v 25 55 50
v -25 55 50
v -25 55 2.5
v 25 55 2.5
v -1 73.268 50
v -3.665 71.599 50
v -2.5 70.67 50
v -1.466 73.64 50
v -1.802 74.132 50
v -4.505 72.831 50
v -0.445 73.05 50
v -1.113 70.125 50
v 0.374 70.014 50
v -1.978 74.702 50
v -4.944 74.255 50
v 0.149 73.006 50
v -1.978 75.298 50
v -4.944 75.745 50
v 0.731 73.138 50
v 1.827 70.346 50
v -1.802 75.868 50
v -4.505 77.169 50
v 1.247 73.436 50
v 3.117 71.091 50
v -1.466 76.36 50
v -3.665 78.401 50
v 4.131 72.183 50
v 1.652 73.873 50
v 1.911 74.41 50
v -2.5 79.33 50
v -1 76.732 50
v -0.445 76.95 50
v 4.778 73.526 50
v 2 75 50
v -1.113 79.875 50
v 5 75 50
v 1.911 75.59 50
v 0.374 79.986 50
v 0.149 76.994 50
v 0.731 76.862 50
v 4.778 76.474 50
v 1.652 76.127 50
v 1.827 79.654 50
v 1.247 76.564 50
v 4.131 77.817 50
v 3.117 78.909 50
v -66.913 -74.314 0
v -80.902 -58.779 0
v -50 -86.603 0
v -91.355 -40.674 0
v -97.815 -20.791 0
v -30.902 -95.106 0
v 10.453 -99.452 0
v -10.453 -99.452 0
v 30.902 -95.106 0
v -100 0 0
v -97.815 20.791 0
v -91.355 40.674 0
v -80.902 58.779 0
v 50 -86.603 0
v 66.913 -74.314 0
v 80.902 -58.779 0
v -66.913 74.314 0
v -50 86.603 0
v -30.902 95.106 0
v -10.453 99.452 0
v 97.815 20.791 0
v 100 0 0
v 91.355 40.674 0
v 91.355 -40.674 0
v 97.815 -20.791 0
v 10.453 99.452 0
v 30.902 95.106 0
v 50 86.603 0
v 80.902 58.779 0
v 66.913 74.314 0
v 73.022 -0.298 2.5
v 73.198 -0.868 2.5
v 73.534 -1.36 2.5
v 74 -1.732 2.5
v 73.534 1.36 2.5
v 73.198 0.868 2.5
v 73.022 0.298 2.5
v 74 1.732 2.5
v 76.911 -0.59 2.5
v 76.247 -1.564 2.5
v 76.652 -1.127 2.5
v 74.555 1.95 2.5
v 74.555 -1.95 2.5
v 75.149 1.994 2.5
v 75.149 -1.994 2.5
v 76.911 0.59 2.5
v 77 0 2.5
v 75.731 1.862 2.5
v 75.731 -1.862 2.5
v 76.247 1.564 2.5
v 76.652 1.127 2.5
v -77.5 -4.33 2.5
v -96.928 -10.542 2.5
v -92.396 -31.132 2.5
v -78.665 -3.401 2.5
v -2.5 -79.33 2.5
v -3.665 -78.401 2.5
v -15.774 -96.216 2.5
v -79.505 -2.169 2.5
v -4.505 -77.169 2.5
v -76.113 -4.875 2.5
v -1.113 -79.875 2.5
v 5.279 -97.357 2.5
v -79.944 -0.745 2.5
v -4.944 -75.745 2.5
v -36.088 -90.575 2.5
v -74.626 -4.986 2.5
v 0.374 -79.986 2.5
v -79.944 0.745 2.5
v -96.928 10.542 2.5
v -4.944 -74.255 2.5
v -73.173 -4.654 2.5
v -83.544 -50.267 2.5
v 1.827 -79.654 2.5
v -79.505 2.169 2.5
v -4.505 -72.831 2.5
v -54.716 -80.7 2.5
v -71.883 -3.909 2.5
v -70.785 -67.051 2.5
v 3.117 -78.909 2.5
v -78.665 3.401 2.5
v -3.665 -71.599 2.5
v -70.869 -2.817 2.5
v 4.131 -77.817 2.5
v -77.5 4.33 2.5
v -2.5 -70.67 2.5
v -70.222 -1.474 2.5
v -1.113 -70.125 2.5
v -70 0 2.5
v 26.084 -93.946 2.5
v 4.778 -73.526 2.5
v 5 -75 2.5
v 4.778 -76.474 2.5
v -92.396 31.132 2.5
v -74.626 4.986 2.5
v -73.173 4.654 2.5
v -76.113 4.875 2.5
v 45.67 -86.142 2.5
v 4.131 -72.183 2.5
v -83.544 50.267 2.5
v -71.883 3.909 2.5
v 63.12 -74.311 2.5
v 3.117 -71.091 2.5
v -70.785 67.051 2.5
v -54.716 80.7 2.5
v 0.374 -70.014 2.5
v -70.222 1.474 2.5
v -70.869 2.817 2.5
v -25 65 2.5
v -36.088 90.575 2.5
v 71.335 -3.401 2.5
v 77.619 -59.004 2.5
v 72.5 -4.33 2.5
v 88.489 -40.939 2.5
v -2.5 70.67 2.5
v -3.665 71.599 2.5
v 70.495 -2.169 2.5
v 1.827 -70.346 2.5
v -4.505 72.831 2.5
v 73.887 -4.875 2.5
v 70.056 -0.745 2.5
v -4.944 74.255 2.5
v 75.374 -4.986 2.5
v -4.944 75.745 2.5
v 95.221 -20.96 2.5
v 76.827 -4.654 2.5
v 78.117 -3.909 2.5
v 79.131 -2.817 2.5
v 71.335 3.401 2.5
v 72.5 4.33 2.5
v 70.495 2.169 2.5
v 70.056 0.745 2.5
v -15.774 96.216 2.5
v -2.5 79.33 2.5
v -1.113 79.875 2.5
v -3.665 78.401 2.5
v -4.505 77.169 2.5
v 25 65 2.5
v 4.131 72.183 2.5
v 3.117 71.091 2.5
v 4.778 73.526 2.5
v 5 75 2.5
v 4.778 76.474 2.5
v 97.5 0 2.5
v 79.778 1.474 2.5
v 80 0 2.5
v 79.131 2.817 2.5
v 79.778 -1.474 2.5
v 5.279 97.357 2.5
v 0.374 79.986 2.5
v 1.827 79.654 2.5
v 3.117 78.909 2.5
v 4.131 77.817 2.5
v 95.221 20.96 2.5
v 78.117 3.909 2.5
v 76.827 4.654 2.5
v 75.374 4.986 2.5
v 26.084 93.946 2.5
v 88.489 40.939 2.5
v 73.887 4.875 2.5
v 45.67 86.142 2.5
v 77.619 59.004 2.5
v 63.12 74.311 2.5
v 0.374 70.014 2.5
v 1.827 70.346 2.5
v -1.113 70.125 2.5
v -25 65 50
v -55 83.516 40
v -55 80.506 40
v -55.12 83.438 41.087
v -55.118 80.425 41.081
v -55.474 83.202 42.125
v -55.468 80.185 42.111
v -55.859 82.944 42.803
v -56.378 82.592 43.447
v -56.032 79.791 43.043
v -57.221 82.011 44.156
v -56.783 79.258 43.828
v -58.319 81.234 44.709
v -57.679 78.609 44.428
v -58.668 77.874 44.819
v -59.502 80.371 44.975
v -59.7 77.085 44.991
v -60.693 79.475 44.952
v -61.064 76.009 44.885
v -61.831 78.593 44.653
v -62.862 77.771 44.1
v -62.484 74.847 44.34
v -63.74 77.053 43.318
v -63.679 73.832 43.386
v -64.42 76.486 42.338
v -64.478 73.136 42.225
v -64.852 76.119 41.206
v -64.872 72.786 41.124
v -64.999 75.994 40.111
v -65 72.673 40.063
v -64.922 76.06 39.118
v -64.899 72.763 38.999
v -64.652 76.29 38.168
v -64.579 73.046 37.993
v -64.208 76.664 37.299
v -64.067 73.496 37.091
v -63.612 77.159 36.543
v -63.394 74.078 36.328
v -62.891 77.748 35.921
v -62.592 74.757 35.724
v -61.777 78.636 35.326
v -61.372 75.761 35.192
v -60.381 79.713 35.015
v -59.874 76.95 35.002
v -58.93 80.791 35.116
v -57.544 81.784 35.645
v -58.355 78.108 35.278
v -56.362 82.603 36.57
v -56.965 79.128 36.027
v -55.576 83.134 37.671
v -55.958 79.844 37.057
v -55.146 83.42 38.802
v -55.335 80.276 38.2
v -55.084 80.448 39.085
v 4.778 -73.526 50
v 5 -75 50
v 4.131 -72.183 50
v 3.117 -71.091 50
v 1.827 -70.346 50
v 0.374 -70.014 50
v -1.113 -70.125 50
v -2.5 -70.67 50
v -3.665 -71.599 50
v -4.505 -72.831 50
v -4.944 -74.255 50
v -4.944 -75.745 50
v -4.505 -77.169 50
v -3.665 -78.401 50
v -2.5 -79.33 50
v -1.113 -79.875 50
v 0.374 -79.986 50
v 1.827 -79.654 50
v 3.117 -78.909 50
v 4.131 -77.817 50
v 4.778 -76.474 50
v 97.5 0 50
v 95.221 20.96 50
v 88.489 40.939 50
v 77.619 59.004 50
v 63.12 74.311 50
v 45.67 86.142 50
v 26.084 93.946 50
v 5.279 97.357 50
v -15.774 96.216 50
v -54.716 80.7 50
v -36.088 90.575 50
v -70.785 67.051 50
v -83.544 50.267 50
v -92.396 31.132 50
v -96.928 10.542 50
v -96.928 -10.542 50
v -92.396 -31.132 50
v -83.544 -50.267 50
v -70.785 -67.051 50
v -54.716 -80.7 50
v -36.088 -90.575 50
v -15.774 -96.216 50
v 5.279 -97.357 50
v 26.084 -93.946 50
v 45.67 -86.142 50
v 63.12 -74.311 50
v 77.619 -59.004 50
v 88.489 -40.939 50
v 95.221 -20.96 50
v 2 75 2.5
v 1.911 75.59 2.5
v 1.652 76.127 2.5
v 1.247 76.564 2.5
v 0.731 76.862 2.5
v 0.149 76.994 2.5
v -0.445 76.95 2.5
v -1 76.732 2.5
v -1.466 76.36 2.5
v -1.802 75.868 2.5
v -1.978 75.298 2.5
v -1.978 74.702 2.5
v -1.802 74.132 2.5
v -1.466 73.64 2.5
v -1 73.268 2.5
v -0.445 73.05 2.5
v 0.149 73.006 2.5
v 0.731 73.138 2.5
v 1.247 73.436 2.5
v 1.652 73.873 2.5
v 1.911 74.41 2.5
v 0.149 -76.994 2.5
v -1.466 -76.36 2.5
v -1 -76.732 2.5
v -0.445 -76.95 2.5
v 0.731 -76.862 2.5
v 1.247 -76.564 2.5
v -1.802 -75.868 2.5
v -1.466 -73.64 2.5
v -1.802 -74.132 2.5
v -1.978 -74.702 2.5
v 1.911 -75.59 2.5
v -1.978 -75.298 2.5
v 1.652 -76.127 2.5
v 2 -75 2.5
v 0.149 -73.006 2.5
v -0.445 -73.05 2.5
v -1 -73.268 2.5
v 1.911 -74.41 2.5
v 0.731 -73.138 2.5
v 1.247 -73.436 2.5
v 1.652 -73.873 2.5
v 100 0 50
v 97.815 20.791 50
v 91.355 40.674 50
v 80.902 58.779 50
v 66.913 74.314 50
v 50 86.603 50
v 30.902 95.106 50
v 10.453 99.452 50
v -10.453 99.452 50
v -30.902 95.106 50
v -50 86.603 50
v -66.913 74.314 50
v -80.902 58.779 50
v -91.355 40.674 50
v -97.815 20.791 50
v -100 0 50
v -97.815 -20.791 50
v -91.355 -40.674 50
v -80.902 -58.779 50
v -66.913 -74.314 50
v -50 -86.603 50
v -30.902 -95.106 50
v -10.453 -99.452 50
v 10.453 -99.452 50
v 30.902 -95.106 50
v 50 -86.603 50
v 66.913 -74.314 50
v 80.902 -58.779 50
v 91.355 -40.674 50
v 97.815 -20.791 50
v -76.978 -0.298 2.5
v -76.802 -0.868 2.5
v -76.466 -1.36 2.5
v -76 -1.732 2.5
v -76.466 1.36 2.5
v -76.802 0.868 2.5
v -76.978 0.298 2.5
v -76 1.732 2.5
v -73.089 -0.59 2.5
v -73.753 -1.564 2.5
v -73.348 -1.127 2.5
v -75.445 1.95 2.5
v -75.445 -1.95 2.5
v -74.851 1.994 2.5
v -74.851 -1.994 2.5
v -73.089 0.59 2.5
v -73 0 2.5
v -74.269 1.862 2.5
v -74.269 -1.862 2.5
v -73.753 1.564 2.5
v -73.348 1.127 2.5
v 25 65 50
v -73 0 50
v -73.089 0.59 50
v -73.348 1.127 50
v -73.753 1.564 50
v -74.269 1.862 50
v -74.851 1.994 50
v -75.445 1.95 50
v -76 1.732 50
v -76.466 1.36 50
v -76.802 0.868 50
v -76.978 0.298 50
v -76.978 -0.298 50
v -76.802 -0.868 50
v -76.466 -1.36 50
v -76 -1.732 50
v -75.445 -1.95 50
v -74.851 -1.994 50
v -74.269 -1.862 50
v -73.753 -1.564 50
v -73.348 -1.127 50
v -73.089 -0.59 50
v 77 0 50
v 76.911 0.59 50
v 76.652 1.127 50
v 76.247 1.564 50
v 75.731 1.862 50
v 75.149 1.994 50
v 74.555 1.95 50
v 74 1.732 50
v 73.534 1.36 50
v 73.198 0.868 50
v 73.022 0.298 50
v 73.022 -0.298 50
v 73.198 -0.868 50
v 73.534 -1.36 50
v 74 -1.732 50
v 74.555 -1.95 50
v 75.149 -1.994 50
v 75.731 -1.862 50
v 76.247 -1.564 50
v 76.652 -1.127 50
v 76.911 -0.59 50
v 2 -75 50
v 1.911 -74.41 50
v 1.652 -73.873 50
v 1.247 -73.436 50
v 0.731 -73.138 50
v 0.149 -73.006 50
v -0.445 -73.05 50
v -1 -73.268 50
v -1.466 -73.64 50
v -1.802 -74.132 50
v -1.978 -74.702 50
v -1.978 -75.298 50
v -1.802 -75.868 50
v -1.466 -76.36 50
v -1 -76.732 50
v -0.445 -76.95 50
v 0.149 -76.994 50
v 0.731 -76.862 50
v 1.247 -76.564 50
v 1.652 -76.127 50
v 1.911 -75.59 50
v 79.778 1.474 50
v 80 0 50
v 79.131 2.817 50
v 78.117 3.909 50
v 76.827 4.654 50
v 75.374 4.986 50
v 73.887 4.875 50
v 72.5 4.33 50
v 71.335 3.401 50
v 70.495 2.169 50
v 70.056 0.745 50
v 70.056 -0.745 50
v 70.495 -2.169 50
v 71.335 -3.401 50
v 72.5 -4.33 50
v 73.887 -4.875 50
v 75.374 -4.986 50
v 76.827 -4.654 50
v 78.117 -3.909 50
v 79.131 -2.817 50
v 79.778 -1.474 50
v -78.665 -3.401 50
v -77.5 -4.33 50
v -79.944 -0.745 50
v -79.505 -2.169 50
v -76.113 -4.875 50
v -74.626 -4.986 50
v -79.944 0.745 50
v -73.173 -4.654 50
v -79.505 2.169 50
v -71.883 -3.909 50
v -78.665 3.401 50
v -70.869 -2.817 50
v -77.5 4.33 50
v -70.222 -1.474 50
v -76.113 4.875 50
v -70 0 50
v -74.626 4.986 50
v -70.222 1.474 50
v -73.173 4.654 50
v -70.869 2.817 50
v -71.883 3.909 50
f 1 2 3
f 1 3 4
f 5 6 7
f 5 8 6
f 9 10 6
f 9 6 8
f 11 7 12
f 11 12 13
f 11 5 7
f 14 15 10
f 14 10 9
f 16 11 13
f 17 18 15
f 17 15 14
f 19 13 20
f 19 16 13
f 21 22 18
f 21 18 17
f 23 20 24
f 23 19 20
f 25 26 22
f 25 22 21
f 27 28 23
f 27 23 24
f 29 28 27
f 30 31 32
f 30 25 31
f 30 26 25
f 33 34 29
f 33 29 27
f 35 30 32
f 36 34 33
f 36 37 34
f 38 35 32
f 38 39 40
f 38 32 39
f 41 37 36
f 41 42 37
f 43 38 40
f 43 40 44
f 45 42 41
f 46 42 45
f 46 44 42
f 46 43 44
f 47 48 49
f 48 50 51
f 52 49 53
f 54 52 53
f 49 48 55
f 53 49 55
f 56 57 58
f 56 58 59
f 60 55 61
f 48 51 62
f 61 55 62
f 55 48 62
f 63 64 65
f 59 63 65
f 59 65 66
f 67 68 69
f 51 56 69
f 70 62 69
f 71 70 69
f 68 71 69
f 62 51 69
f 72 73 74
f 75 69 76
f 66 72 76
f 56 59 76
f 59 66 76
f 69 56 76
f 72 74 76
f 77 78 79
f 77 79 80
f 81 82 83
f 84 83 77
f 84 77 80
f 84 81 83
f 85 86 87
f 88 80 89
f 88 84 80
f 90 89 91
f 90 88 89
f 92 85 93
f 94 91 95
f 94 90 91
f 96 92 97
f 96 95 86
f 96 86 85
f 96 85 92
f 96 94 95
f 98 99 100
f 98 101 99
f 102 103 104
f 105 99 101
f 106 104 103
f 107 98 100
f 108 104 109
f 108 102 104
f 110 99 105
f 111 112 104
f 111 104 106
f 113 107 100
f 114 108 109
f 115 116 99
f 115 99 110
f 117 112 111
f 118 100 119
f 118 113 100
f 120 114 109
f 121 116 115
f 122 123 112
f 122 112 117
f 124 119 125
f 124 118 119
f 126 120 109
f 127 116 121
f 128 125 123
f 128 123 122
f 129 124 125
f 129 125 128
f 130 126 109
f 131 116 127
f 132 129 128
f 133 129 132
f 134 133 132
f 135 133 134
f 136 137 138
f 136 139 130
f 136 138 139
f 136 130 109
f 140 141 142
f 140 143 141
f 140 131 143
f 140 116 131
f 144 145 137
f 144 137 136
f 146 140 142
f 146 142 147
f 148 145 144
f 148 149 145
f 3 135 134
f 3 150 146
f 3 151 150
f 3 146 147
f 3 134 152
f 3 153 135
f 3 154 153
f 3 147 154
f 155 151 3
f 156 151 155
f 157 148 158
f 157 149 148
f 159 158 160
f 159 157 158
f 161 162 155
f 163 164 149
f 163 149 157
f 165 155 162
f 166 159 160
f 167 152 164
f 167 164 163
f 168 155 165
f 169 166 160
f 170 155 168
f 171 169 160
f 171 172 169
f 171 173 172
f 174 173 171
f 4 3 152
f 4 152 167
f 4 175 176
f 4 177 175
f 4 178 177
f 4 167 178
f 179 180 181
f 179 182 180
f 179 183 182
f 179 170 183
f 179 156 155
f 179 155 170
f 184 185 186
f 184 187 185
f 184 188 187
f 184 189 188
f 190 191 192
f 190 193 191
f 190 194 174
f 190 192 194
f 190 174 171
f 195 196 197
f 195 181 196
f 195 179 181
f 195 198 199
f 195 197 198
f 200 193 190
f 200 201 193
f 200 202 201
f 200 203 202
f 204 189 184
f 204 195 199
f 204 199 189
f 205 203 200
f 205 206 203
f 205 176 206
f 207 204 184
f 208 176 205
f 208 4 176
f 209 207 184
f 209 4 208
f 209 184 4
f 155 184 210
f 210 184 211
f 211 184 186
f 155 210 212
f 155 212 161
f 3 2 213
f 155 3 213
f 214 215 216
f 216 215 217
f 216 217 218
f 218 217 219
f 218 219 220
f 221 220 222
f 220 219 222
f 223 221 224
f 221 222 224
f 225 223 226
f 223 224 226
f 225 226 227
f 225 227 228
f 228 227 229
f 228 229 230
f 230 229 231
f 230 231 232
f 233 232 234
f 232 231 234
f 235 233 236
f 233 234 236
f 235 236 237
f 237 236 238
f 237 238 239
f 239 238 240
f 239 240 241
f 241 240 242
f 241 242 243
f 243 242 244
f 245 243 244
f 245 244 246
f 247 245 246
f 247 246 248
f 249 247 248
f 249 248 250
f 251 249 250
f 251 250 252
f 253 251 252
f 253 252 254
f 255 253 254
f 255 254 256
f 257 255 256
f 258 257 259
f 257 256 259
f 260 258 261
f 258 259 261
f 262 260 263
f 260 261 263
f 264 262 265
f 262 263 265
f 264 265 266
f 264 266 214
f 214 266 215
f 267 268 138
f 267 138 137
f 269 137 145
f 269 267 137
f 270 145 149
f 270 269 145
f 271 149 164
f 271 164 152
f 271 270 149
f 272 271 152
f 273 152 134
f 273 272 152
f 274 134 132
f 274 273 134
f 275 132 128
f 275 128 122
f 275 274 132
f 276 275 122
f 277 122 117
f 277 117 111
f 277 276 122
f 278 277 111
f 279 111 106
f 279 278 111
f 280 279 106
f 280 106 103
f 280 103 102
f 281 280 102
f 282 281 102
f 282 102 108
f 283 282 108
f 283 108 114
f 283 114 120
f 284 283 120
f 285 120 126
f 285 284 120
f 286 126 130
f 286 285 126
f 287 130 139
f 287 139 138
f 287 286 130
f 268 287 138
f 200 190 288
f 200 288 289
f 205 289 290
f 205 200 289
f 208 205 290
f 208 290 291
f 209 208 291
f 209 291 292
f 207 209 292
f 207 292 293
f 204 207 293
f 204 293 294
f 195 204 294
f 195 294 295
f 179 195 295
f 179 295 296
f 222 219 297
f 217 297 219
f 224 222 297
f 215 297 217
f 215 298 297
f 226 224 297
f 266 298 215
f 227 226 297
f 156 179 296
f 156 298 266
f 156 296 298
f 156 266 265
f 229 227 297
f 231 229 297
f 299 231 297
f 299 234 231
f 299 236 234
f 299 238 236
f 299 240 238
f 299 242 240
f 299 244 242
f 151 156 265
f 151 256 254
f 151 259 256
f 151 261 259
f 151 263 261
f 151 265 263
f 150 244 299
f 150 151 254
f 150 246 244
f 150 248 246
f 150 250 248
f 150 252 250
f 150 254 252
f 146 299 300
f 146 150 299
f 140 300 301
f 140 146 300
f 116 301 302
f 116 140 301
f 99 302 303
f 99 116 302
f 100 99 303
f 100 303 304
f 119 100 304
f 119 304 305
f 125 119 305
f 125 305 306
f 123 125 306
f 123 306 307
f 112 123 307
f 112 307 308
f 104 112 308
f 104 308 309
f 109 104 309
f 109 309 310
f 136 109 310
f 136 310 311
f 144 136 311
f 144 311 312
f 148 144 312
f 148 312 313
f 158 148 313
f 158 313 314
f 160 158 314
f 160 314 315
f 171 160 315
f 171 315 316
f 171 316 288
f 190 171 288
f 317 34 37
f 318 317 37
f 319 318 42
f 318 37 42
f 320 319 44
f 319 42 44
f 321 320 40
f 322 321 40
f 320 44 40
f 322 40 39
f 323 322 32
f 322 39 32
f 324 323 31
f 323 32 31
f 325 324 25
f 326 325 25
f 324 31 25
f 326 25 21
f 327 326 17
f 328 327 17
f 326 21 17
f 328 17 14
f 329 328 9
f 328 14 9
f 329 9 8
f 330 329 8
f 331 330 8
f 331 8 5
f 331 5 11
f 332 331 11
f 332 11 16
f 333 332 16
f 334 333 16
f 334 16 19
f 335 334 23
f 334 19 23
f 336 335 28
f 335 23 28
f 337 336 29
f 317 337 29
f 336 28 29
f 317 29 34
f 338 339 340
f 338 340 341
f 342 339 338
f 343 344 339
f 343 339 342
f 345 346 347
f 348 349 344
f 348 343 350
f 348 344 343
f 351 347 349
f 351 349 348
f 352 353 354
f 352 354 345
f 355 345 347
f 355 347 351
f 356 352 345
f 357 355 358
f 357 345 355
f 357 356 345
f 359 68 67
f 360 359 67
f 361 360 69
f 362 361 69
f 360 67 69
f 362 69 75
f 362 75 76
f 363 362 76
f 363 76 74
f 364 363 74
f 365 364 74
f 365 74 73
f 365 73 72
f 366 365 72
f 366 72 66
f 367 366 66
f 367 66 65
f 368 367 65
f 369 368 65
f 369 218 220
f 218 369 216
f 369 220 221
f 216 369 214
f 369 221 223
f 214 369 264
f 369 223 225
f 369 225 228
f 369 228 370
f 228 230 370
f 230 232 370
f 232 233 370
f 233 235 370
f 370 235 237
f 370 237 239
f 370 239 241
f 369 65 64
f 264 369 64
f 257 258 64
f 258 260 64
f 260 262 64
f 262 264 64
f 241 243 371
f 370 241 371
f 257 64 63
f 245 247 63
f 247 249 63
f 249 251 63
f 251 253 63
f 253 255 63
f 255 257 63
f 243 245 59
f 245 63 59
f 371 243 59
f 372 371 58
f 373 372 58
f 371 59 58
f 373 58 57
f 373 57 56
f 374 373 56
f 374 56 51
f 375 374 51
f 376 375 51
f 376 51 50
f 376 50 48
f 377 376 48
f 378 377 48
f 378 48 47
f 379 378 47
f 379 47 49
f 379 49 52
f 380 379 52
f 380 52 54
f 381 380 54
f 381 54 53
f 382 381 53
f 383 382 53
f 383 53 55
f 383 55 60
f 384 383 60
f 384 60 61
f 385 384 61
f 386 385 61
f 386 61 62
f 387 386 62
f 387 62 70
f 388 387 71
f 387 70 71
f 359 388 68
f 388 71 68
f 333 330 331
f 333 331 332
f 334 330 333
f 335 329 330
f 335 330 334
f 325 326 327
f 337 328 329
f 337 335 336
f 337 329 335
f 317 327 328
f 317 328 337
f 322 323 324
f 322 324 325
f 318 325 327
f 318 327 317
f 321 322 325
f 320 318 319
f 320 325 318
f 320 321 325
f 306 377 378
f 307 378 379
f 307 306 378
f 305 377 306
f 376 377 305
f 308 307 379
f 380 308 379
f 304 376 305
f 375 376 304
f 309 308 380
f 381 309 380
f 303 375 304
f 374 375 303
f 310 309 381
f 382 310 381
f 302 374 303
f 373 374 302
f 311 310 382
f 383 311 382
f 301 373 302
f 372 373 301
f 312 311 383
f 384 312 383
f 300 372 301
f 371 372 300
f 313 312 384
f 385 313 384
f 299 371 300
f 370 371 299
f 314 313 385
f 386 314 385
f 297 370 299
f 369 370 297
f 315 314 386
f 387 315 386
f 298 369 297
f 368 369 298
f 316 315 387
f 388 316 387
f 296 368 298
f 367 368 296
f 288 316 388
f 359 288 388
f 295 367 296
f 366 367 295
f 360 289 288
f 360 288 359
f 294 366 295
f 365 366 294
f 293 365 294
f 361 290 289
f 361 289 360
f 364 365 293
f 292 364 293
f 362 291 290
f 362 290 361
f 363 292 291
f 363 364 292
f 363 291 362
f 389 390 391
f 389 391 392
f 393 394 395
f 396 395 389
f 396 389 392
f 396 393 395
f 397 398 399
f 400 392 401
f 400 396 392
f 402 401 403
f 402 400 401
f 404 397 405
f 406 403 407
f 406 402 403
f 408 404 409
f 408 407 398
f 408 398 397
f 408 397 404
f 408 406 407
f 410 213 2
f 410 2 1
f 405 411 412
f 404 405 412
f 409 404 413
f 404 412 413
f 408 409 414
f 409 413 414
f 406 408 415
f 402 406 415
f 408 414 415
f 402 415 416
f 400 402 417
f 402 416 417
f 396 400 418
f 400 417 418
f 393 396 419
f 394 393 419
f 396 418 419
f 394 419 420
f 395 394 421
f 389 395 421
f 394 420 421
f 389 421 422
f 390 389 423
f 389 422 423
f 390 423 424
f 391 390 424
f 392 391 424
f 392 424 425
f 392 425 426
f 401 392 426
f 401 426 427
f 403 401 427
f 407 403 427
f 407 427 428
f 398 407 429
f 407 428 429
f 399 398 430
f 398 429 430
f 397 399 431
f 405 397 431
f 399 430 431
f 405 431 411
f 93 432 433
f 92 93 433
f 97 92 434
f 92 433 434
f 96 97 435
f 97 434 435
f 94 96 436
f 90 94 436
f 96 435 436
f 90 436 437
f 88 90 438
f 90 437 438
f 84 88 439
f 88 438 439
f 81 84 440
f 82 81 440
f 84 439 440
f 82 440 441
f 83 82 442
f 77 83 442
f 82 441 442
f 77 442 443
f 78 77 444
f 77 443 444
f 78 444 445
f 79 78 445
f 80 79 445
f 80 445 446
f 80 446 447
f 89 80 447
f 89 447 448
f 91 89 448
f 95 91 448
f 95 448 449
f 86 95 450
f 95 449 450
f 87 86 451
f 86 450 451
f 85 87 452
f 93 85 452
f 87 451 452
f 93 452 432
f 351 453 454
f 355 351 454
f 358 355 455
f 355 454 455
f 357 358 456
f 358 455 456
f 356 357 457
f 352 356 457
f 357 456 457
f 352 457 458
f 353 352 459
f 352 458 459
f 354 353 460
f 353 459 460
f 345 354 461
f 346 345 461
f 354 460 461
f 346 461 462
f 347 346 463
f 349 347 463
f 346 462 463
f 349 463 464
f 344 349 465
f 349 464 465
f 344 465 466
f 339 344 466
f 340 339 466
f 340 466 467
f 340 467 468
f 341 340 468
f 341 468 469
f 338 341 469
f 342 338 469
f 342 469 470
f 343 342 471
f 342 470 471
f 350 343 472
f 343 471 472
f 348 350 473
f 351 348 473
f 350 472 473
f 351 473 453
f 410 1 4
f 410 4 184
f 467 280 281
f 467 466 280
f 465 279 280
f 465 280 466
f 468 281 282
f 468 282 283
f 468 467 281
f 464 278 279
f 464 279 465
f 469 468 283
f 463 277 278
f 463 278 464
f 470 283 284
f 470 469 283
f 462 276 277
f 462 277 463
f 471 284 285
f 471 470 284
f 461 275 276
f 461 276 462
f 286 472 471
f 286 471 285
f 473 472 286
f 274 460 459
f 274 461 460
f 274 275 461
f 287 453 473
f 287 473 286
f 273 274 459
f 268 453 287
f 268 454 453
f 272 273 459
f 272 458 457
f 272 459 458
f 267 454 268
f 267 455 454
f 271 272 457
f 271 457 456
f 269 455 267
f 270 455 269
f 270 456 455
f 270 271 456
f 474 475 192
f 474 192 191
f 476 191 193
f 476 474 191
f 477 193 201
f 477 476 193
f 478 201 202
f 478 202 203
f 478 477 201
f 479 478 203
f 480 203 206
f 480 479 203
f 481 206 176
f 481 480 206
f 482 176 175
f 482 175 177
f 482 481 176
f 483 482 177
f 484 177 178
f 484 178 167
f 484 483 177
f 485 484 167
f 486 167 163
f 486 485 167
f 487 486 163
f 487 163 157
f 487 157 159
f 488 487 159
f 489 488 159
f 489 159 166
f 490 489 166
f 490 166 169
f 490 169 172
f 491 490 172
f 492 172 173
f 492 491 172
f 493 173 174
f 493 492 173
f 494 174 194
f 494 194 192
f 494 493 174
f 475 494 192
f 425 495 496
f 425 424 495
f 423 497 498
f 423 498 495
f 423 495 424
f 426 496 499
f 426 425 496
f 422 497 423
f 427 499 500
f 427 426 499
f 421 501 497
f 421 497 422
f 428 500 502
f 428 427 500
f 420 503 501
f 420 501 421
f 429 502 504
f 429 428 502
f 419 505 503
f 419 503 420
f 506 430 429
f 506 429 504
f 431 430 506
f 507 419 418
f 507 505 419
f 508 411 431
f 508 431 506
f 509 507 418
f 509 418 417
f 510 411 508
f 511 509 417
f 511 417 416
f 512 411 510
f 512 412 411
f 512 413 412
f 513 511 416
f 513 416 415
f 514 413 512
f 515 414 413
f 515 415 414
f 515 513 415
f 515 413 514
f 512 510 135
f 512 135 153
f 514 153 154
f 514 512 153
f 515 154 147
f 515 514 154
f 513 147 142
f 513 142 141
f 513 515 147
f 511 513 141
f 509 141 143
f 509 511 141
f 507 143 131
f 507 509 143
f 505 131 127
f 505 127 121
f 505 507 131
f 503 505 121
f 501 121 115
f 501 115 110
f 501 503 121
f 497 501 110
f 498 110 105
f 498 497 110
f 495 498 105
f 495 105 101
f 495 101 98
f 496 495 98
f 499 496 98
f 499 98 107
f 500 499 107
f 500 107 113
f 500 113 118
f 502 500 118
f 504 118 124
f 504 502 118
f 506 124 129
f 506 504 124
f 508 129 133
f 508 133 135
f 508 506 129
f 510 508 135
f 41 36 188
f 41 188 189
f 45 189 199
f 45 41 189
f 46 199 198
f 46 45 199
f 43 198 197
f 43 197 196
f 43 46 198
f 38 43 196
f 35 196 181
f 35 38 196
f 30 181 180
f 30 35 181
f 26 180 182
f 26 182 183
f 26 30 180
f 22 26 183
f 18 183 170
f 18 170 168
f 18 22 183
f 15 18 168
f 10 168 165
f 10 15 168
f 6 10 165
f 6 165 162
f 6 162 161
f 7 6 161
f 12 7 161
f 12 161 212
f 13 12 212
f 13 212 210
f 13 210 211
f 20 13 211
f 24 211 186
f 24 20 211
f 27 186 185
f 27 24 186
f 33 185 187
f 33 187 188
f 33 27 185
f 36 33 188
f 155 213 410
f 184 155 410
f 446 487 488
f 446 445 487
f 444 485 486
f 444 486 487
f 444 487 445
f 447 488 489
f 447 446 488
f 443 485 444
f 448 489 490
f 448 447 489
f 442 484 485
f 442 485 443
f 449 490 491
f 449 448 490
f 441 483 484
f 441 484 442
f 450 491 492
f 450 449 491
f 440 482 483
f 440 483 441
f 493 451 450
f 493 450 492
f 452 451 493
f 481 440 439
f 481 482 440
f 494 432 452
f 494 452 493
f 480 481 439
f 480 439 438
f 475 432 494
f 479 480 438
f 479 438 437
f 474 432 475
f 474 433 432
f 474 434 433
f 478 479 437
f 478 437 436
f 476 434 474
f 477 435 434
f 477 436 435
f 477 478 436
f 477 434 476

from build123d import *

# Parameters (mm, degrees)
F0_R     = 100
F1_DEPTH = 50
F2_T     = -2.5
F3_R     = 5
F3_R_2   = 2
F4_DEPTH = 47.5
F6_R     = 5
F7_DEPTH = 100.001
F5_W     = 50
F5_H     = 10
F8_DEPTH = 47.5


with BuildPart() as f1:
    # F0 (on Top) → F1 (new body)
    with BuildSketch(Plane.XY):
        Circle(F0_R)
    extrude(amount=F1_DEPTH)

    # F2
    f2_openings = [f1.faces().sort_by_distance(p)[0] for p in [
        (0, 0, 50),
    ]]
    offset(amount=F2_T, openings=f2_openings)

    # F3 (on face) → F4 (join, through all)
    with BuildSketch(Plane.XY.offset(50)):
        with Locations((-75, 0)):
            Circle(F3_R)
        with Locations((-75, 0)):
            Circle(F3_R_2, mode=Mode.SUBTRACT)
        with Locations((0, -75)):
            Circle(F3_R)
        with Locations((0, -75)):
            Circle(F3_R_2, mode=Mode.SUBTRACT)
        with Locations((75, 0)):
            Circle(F3_R)
        with Locations((75, 0)):
            Circle(F3_R_2, mode=Mode.SUBTRACT)
        with Locations((0, 75)):
            Circle(F3_R)
        with Locations((0, 75)):
            Circle(F3_R_2, mode=Mode.SUBTRACT)
    extrude(amount=-F4_DEPTH)

    # F6 (on Front) → F7 (cut, through all)
    with BuildSketch(Plane.XZ):
        with Locations((-60, 40)):
            Circle(F6_R)
    extrude(amount=-F7_DEPTH, mode=Mode.SUBTRACT)

    # F5 (on face) → F8 (join, through all)
    with BuildSketch(Plane.XY.offset(50)):
        with Locations((0, 60)):
            Rectangle(F5_W, F5_H)
    extrude(amount=-F8_DEPTH)


solid = f1.part
